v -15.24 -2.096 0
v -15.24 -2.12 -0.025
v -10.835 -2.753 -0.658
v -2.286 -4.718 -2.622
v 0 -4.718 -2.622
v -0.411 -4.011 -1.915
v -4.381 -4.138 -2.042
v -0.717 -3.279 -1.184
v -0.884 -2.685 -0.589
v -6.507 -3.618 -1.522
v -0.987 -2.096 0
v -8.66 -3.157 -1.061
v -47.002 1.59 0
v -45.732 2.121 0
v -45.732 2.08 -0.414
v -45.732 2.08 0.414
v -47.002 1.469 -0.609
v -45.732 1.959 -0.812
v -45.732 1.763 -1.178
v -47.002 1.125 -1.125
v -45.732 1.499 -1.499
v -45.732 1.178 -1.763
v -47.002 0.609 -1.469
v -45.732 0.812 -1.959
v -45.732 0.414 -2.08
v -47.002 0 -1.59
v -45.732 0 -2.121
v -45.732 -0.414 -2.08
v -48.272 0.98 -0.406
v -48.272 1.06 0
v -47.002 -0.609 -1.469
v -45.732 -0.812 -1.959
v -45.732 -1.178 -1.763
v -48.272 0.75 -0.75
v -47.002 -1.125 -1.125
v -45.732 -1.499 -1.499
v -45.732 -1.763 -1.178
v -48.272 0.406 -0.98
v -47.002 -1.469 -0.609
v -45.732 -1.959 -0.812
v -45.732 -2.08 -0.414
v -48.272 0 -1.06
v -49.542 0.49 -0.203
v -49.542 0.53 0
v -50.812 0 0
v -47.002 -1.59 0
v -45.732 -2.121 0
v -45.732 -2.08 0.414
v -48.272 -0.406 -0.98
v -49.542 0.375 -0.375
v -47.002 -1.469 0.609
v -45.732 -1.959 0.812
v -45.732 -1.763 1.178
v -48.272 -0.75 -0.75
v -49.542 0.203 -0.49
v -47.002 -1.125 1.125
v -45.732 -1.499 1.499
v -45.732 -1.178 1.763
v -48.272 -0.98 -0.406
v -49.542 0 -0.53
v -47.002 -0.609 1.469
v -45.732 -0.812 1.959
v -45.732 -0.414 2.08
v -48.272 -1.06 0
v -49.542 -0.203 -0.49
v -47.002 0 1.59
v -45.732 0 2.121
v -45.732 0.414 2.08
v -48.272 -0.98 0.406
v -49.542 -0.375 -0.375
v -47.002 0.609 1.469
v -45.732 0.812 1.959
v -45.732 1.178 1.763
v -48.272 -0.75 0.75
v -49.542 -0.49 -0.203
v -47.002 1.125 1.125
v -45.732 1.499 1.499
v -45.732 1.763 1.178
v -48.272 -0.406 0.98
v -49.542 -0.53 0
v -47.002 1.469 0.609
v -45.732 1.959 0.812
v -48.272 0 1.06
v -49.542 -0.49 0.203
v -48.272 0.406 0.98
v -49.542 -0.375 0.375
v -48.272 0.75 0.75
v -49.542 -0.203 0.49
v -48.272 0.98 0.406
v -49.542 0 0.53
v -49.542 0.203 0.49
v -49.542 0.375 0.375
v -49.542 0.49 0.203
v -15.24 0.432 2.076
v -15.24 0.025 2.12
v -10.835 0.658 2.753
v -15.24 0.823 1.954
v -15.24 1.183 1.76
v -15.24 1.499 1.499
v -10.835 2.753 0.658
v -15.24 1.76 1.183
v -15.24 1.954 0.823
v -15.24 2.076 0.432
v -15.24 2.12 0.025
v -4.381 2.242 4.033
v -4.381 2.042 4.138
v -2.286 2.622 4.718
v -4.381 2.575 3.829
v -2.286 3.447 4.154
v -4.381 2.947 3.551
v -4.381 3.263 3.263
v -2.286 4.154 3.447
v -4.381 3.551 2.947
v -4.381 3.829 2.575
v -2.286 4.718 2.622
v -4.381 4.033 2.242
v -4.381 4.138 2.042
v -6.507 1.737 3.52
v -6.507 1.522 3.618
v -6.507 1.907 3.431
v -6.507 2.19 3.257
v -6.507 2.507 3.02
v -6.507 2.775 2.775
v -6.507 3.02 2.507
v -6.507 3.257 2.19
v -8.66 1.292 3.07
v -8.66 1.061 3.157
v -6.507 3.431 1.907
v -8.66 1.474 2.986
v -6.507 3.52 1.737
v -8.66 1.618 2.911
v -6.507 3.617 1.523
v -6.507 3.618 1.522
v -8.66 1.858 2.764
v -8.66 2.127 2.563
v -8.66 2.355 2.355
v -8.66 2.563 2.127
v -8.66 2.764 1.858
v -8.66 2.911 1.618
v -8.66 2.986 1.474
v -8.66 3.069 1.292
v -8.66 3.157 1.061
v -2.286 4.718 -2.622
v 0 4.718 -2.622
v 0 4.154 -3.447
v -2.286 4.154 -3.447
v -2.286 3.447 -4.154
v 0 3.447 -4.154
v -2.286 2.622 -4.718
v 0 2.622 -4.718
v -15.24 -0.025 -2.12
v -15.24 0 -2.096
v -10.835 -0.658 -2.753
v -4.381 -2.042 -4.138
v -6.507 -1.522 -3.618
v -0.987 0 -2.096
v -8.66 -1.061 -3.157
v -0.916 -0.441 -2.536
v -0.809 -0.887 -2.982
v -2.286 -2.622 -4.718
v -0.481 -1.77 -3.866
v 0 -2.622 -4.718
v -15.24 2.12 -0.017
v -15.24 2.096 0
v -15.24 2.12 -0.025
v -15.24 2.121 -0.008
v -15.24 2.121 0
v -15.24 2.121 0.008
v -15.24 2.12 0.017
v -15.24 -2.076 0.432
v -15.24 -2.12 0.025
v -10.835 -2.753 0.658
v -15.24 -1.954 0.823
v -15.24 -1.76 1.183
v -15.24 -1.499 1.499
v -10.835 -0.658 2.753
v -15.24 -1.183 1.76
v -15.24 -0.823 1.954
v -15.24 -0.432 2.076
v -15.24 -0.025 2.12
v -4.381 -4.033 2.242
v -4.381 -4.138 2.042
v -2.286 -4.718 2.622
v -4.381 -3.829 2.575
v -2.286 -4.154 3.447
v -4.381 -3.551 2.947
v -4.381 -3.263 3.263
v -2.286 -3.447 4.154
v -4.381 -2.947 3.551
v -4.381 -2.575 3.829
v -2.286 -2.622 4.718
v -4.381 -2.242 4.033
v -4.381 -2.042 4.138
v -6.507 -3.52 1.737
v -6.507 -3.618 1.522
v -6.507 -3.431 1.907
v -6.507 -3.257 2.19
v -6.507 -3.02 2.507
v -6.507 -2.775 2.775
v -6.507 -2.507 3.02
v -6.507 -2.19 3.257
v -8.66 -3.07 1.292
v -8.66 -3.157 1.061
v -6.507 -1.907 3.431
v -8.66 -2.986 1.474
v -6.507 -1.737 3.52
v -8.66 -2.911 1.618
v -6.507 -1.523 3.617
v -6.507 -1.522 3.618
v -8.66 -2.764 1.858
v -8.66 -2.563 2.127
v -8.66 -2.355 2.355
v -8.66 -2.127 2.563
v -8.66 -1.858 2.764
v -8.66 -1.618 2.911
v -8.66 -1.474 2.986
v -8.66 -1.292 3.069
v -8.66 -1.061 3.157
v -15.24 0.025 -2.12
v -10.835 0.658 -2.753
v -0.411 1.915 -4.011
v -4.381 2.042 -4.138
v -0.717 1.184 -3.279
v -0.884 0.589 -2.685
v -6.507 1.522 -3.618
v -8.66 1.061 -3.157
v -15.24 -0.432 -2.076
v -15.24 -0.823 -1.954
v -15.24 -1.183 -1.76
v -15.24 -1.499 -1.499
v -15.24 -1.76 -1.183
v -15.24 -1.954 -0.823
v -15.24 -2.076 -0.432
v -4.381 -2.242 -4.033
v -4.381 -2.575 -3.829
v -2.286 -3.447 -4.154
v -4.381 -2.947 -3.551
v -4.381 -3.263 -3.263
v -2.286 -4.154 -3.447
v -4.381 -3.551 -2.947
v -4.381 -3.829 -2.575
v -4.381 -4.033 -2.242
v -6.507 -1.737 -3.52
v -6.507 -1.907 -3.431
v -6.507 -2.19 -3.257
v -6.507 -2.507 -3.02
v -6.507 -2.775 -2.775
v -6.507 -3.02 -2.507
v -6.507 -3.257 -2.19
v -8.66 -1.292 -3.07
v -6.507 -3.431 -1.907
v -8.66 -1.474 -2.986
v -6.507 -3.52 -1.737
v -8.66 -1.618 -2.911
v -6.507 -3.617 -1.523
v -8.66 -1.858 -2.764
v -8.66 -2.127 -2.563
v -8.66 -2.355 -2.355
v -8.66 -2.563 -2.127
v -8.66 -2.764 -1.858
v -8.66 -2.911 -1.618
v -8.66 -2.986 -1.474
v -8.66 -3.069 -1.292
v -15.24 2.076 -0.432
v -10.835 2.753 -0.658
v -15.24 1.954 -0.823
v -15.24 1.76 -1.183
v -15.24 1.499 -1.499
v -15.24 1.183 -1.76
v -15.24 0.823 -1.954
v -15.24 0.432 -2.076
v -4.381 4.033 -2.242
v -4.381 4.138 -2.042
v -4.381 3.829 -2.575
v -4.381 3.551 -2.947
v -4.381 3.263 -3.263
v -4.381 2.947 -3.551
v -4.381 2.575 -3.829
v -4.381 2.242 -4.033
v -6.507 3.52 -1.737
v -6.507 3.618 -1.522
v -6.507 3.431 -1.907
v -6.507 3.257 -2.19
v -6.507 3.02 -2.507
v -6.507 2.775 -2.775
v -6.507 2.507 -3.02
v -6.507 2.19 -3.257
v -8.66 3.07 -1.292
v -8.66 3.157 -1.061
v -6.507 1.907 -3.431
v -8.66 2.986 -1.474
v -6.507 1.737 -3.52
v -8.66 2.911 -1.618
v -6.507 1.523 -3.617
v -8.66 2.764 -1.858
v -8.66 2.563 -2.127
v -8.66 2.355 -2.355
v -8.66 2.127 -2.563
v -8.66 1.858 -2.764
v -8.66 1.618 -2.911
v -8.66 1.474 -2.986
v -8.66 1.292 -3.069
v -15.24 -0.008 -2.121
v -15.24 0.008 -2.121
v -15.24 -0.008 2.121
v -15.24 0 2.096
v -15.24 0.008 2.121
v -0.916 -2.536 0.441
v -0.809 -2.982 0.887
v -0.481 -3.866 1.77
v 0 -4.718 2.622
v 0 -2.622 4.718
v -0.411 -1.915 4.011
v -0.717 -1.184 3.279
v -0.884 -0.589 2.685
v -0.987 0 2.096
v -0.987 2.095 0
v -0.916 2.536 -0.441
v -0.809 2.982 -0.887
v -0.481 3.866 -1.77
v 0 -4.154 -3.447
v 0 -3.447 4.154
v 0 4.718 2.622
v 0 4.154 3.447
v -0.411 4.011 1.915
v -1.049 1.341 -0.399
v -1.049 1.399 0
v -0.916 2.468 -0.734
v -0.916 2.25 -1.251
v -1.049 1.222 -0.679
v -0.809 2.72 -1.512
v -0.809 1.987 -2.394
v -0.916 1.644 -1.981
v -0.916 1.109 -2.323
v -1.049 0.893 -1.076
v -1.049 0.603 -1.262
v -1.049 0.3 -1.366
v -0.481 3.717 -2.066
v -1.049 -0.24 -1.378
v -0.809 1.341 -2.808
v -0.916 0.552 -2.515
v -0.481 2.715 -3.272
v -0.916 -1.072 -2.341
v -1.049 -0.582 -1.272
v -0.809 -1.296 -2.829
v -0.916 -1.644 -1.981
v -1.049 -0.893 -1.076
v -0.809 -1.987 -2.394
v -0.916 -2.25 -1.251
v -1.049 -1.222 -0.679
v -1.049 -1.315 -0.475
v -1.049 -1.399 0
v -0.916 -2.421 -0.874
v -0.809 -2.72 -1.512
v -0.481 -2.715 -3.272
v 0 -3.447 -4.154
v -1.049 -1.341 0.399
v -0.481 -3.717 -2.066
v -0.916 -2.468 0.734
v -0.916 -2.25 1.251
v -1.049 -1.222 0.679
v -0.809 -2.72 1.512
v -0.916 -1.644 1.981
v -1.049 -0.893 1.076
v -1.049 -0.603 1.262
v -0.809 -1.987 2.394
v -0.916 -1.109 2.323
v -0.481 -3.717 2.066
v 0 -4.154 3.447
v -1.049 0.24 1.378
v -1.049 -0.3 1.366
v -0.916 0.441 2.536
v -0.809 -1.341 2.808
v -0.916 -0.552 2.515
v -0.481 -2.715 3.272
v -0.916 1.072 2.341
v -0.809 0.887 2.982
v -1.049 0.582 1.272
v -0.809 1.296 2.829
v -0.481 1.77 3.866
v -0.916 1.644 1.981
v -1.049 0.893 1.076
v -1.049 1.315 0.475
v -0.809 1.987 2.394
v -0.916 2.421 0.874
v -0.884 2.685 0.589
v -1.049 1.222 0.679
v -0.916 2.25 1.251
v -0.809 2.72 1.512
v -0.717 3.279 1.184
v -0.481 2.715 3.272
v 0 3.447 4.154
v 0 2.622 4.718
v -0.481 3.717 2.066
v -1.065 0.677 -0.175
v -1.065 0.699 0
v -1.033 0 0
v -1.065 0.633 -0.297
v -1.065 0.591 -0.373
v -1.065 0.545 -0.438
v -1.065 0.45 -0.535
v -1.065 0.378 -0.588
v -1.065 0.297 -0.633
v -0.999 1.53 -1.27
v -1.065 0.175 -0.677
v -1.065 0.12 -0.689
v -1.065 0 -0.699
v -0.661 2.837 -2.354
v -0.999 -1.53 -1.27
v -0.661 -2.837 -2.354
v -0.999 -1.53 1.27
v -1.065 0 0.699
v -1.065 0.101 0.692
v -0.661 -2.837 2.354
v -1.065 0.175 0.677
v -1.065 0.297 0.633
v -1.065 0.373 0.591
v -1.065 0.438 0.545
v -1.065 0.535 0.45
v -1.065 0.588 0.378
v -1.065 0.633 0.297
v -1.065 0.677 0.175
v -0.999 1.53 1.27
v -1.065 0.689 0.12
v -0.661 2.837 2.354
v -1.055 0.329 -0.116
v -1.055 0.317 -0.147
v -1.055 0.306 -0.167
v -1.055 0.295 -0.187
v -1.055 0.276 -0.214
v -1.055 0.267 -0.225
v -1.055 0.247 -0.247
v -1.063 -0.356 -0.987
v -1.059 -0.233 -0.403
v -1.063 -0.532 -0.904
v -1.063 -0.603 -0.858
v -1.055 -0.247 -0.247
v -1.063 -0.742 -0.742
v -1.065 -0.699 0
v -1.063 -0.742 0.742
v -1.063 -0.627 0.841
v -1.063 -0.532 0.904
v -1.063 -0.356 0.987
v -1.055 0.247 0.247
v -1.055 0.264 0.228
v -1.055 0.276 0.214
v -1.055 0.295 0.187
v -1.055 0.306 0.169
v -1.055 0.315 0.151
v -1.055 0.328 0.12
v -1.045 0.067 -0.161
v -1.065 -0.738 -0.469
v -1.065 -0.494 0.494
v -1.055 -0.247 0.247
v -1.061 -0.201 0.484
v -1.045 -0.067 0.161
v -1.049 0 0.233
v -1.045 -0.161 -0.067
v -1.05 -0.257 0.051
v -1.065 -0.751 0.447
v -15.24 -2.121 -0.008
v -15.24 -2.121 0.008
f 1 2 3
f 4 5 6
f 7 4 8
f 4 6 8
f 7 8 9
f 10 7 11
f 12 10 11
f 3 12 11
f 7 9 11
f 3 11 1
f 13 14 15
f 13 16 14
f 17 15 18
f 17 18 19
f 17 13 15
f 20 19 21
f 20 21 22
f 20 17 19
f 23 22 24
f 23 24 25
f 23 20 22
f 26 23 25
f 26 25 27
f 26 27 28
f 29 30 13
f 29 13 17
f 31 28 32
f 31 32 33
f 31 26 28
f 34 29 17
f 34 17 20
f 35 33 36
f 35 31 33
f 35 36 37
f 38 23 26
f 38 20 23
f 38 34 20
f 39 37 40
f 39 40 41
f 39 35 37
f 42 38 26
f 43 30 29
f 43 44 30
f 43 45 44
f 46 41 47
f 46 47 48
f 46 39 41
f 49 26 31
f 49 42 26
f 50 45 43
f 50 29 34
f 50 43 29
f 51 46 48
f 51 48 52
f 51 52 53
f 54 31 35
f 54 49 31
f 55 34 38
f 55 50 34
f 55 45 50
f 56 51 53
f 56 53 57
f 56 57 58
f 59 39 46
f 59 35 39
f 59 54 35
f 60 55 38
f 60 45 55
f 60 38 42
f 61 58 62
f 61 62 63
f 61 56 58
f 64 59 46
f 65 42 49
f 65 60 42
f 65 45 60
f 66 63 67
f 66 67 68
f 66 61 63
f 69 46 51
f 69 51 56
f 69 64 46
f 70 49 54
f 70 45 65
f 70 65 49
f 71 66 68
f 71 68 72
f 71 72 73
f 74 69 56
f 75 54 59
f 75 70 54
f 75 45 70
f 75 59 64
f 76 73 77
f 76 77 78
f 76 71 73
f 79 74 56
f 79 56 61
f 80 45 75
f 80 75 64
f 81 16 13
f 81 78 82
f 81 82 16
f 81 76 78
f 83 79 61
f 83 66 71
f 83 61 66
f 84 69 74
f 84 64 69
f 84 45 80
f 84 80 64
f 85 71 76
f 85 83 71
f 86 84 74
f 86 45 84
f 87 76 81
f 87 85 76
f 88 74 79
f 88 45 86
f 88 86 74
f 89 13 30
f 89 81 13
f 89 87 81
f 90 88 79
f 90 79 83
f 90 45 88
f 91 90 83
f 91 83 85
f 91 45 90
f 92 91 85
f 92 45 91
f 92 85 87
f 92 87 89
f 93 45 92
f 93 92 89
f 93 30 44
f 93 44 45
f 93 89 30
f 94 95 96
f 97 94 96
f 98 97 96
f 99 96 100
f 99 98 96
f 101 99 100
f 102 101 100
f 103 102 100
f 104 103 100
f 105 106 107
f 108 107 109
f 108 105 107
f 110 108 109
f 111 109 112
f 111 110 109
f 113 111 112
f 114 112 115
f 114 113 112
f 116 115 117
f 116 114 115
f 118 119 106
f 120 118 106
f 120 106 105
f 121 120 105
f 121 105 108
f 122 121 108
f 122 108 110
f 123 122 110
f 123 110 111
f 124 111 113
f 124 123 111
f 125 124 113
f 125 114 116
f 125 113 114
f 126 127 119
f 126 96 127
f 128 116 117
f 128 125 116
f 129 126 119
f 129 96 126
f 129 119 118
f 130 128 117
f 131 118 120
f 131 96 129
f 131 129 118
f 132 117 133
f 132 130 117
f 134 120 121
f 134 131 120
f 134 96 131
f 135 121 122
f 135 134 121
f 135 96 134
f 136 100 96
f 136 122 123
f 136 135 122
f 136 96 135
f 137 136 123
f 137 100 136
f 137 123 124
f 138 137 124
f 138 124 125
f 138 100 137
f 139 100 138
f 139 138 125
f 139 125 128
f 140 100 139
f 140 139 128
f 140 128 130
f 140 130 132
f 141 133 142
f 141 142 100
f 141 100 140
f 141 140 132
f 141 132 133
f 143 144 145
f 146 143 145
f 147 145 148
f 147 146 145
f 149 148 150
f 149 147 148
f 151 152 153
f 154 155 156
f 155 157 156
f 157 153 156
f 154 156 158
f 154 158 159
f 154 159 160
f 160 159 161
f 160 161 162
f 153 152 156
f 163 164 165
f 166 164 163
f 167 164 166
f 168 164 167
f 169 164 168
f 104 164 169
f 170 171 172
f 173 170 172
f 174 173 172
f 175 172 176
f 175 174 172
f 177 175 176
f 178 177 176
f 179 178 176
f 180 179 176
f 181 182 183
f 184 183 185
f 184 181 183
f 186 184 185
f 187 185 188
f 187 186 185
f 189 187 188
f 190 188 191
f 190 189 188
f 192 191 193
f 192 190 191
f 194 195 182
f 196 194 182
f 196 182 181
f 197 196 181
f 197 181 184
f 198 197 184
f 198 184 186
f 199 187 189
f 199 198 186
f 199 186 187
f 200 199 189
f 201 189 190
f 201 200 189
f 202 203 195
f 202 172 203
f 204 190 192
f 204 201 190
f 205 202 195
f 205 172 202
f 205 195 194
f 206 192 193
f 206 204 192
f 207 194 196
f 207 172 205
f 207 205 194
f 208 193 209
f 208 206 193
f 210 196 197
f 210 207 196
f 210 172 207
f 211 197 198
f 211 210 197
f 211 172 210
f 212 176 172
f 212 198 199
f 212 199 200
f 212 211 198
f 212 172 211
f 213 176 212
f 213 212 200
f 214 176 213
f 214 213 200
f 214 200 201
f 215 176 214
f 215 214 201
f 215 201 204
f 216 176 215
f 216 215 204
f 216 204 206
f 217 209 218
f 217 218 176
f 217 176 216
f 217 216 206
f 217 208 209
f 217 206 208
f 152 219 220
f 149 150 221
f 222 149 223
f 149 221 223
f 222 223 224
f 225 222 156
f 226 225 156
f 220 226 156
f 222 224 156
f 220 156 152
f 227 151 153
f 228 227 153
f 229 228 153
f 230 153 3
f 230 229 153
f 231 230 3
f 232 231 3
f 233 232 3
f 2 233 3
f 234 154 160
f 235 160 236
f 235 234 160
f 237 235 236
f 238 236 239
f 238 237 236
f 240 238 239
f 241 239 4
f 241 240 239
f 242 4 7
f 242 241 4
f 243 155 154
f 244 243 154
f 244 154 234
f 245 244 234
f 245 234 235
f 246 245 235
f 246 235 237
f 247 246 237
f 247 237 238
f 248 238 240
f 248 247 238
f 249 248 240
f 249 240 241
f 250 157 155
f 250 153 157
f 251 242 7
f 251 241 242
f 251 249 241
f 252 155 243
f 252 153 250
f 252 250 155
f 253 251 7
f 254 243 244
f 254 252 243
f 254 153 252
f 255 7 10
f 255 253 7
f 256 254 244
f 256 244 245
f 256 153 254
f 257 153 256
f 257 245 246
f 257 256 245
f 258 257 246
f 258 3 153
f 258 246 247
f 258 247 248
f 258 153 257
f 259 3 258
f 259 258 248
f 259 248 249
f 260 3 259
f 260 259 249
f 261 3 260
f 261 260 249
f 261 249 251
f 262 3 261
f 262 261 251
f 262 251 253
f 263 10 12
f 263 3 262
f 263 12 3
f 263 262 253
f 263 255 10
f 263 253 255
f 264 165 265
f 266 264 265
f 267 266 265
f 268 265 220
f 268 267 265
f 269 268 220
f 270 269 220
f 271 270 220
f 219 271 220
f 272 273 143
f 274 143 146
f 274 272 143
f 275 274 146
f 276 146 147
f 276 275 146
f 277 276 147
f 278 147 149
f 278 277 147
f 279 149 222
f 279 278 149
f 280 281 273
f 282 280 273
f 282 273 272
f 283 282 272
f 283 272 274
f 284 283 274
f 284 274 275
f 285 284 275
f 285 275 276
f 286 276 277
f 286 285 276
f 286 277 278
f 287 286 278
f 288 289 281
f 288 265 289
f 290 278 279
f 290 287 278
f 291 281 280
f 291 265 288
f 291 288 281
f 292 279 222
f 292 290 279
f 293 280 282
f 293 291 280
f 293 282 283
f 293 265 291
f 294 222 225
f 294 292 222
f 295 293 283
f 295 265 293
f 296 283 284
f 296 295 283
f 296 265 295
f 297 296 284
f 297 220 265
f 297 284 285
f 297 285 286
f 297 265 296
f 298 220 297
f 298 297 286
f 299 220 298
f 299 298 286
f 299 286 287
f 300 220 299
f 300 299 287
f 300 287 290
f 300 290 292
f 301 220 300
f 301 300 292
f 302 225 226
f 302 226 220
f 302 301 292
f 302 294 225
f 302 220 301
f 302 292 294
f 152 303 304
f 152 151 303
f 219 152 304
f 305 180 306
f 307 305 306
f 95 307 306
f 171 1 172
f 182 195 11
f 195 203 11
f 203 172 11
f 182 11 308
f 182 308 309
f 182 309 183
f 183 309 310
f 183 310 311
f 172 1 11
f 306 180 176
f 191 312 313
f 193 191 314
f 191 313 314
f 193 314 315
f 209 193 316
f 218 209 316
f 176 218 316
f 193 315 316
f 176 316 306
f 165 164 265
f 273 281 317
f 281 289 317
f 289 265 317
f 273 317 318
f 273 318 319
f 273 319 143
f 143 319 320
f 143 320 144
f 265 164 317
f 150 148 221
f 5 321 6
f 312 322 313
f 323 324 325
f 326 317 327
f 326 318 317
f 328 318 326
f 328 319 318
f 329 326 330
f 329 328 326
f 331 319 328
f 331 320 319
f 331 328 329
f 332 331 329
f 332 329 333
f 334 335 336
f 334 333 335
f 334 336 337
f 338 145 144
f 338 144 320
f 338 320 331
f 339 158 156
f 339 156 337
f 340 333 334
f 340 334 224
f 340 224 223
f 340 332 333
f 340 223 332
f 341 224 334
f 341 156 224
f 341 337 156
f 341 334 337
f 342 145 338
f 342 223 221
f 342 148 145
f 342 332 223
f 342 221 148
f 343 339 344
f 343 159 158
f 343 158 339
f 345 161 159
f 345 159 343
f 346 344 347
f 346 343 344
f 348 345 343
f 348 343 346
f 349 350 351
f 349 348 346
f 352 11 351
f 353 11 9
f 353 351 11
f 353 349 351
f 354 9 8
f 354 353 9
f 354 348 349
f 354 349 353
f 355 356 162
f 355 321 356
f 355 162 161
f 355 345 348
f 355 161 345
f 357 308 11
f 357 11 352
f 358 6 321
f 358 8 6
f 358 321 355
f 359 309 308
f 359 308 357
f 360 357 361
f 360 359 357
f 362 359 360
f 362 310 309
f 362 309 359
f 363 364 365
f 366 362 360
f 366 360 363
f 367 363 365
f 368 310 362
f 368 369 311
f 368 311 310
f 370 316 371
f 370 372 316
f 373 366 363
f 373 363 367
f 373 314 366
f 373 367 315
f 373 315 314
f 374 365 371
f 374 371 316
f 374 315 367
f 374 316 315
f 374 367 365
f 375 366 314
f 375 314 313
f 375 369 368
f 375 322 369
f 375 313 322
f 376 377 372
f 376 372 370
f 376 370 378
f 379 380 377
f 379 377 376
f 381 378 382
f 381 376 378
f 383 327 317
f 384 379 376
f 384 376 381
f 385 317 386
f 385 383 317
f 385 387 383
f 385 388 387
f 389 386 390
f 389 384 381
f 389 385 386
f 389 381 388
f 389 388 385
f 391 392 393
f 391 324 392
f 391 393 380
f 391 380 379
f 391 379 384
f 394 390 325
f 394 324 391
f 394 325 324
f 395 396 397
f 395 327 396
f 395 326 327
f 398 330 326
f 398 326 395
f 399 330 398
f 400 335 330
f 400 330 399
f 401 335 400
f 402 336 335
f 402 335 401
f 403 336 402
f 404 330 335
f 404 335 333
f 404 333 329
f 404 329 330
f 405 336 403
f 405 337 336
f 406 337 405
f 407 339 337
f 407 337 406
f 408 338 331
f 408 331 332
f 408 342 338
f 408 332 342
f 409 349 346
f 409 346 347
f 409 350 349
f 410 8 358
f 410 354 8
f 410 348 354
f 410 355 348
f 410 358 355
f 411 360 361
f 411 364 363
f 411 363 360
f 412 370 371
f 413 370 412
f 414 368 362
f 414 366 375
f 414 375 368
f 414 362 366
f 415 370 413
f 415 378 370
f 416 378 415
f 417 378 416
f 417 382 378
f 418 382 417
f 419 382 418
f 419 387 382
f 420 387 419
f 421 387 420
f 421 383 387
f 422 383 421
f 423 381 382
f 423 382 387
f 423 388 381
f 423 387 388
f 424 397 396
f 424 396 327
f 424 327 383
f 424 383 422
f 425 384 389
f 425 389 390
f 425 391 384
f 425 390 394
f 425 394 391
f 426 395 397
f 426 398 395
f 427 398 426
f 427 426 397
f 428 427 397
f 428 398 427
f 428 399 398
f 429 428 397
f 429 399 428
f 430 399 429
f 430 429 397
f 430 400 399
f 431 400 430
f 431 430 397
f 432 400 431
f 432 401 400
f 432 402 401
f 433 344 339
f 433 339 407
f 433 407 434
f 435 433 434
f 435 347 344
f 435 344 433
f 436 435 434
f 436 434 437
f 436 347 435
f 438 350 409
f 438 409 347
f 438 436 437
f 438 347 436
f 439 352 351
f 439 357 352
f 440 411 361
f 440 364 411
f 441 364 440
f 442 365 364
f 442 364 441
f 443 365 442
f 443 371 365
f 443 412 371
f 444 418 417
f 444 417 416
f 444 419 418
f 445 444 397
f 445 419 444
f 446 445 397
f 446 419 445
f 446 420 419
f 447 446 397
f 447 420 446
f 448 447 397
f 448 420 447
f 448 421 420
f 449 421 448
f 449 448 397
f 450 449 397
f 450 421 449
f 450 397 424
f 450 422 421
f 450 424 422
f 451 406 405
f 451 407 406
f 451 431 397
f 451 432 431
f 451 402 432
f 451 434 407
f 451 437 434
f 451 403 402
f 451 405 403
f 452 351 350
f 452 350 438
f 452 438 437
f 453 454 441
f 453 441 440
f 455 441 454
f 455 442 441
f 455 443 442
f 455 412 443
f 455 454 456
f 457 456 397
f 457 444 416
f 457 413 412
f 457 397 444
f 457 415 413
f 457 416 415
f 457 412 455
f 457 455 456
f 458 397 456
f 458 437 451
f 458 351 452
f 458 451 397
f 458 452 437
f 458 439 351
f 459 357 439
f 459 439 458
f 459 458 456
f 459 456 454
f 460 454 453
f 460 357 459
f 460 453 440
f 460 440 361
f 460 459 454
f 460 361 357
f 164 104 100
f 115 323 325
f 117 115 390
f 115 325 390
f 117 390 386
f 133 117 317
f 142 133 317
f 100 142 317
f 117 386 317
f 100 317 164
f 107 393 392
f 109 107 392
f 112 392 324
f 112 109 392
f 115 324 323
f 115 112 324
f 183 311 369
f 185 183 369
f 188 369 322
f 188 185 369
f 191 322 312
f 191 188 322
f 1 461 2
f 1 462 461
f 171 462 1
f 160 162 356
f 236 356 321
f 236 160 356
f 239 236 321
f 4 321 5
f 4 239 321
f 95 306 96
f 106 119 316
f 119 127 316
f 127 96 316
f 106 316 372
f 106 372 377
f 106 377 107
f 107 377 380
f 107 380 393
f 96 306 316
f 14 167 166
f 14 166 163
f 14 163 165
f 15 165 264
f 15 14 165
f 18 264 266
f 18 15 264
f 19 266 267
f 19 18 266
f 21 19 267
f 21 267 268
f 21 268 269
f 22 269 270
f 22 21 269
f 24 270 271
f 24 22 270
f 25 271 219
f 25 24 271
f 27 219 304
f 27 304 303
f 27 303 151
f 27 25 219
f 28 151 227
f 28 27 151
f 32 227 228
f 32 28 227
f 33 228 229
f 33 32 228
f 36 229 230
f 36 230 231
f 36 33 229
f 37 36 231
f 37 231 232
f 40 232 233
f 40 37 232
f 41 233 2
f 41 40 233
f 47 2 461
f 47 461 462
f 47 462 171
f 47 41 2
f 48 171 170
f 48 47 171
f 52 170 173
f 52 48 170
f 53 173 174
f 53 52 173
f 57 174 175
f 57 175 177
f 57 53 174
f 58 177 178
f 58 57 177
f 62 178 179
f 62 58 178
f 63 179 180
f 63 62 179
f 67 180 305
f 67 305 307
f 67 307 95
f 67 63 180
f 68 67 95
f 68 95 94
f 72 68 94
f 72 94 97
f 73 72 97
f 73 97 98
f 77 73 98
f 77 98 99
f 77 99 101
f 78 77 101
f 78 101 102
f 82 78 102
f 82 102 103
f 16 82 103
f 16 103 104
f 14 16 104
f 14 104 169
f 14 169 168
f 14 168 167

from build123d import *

# Parameters (mm, degrees)
F3_DEPTH = 15.24


with BuildPart() as f1:
    # F0 (on Top) → F1 (revolve)
    with BuildSketch(Plane.XY):
        with BuildLine():
            ThreePointArc((-1.032711, 0), (-0.880739, 2.768468), (0, 5.3975))
            Line((0, 5.3975), (-2.286, 5.3975))
            ThreePointArc((-2.286, 5.3975), (-8.654858, 3.331535), (-15.24, 2.120558))
            Line((-15.24, 2.120558), (-45.731511, 2.120558))
            Line((-45.731511, 2.120558), (-50.811511, 0))
            Line((-50.811511, 0), (-1.032711, 0))
        make_face()
    revolve(axis=Axis((-25.922111, 0, 0), (-1, 0, 0)))

    # F2 (on Right) → F3 (cut)
    with BuildSketch(Plane.YZ):
        Polygon((3.833906, -5.929406), (0, -2.0955), (-3.833906, -5.929406), align=None)
        Polygon((-6.421372, -4.325872), (-2.0955, 0), (-6.421372, 4.325872), align=None)
        Polygon((6.06417, 3.96867), (2.0955, 0), (6.06417, -3.96867), align=None)
        Polygon((-4.487521, 6.583021), (0, 2.0955), (4.487521, 6.583021), align=None)
    extrude(amount=-F3_DEPTH, mode=Mode.SUBTRACT)


solid = f1.part
